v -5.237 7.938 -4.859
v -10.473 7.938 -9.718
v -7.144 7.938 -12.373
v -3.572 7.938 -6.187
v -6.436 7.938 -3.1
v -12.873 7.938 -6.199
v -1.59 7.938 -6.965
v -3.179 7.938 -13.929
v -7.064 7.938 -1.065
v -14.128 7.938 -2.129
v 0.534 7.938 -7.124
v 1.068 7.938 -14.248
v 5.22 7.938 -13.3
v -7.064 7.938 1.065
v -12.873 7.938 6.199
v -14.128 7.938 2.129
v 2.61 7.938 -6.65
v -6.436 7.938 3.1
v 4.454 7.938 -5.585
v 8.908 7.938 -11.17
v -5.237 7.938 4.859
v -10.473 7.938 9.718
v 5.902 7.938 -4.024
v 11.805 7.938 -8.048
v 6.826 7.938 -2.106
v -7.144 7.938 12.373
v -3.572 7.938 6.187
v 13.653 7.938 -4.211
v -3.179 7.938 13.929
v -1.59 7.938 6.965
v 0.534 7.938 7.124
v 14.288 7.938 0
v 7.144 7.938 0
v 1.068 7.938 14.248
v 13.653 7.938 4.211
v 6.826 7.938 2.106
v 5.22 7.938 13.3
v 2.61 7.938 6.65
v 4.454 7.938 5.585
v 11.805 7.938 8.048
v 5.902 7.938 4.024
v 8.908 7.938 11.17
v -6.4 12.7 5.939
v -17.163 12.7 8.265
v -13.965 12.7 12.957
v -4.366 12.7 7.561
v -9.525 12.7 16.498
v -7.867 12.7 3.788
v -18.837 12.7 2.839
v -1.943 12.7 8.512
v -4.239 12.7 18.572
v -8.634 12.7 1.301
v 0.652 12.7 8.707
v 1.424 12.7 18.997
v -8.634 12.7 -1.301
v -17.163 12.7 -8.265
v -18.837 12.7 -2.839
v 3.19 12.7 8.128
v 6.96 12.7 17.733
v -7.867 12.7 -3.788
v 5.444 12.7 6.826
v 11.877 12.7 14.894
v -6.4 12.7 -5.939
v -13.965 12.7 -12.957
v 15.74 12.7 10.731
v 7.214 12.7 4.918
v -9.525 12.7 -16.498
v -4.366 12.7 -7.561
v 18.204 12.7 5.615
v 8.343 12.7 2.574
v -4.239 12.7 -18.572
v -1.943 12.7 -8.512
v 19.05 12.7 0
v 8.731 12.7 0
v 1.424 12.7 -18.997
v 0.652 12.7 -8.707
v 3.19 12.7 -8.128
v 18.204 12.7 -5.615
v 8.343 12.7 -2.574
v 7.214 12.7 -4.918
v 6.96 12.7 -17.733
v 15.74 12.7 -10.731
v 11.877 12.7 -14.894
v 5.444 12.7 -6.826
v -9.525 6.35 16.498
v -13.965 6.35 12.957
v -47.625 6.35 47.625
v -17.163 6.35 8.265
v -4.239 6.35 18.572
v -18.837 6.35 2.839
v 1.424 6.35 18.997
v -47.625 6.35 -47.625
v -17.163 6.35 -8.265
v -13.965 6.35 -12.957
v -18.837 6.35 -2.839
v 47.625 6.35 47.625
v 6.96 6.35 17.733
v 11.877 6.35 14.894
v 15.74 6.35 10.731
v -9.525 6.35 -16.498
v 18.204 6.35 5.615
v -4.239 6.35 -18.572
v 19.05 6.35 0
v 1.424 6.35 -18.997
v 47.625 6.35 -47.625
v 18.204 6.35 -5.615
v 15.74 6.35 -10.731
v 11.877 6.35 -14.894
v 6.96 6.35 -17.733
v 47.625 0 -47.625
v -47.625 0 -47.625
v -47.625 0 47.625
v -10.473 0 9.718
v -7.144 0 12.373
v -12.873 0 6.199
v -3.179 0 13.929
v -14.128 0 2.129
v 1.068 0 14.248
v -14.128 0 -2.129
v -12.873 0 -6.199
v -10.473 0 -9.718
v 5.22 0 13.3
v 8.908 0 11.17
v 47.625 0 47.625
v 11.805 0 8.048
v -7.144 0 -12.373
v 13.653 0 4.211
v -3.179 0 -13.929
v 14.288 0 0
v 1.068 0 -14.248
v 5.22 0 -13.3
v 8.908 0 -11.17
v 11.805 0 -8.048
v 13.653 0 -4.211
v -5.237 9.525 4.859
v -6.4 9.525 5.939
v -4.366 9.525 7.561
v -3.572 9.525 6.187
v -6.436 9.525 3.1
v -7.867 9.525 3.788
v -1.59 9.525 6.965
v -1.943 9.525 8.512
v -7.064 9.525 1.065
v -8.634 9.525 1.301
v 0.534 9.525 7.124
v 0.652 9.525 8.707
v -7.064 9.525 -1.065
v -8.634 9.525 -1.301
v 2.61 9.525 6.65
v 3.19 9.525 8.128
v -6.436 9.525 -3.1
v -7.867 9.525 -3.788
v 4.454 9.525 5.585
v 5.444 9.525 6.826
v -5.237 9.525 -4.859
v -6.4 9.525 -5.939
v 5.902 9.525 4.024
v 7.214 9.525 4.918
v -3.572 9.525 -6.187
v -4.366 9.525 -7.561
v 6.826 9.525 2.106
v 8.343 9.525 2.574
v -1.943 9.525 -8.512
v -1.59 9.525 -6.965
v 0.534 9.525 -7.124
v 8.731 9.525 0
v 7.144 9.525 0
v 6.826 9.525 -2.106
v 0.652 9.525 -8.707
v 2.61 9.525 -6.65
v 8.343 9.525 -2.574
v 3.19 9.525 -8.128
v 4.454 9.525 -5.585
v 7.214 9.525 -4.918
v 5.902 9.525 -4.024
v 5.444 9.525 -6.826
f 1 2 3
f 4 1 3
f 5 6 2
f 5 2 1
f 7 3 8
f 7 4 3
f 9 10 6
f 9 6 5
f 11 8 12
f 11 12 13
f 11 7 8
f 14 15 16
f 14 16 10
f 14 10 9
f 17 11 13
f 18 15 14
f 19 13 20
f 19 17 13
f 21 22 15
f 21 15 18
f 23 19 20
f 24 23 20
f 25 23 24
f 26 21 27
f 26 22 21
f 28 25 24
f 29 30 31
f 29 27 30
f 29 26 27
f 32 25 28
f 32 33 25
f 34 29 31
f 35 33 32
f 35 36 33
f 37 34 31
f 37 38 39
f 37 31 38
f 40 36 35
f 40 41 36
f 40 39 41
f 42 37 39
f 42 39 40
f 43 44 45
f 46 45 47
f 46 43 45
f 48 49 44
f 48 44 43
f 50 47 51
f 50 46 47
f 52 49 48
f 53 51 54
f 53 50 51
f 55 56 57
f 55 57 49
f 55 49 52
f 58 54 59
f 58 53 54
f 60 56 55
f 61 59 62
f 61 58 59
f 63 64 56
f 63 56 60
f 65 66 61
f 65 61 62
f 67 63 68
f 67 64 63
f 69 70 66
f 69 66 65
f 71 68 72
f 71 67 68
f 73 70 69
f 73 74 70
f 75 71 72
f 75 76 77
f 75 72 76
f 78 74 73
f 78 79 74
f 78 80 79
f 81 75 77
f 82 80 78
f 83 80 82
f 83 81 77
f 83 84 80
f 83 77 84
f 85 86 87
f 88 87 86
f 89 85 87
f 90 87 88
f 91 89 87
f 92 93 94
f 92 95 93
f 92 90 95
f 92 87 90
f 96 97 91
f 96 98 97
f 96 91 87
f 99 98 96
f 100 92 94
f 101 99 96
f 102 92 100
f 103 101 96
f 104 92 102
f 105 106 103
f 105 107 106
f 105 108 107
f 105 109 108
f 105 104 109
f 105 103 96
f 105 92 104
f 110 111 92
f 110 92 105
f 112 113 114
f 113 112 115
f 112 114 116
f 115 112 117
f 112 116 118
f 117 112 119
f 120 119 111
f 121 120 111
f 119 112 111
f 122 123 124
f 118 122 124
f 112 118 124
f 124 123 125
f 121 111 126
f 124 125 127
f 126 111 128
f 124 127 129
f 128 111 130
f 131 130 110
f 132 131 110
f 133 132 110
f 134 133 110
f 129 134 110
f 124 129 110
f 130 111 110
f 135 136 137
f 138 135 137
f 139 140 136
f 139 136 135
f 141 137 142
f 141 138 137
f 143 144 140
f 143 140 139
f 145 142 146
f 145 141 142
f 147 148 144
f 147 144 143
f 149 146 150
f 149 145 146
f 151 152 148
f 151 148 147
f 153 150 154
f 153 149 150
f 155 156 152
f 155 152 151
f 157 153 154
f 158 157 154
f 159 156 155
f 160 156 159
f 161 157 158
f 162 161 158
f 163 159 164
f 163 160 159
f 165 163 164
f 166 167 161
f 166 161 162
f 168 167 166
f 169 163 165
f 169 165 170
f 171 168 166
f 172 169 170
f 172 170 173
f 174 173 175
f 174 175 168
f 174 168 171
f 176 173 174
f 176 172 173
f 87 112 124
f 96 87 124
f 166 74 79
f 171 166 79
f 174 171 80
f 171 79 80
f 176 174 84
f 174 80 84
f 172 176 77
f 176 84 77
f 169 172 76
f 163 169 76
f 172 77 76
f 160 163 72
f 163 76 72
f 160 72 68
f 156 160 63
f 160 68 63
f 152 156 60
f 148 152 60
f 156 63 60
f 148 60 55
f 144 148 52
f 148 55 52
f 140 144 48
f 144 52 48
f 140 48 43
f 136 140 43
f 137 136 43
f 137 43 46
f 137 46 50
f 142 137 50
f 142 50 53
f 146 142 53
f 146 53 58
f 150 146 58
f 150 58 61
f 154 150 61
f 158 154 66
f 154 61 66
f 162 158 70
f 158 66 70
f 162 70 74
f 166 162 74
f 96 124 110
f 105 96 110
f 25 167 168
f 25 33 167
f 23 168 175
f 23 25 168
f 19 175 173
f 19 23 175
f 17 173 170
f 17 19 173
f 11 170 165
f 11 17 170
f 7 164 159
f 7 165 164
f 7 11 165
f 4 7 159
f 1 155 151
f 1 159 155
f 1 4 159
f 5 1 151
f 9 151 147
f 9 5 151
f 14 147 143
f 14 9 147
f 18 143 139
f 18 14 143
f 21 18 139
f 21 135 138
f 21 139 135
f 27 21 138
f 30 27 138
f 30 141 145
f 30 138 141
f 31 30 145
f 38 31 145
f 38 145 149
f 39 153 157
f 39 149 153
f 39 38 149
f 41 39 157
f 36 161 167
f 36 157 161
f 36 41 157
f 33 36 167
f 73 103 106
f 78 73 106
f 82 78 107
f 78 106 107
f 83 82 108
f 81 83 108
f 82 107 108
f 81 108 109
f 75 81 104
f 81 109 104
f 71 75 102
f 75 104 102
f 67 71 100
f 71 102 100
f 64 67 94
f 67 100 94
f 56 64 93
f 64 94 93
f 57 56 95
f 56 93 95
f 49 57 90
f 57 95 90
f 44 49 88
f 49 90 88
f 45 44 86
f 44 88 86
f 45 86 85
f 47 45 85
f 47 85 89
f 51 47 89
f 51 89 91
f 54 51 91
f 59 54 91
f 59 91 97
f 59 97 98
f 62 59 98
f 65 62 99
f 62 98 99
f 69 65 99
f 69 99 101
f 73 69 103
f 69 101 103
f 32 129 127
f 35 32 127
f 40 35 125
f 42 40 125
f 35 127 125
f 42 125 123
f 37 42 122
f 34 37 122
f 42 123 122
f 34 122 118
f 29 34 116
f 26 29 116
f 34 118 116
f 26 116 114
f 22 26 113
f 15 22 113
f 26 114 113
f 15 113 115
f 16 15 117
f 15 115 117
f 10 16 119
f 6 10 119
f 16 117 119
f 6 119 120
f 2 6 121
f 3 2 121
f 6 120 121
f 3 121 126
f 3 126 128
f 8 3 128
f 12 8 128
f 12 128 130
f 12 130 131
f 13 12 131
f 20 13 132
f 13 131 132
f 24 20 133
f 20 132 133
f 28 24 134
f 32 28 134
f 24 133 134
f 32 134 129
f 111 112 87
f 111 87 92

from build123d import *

# Parameters (mm, degrees)
SKETCH1_W           = 95.25
SKETCH1_H           = 95.25
SKETCH1_R           = 7.14375
BOSS_EXTRUDE1_DEPTH = 6.35
SKETCH3_R           = 19.05
SKETCH3_R_2         = 7.14375
BOSS_EXTRUDE2_DEPTH = 6.35
SKETCH2_R           = 14.2875
CUT_EXTRUDE1_DEPTH  = 7.9375
SKETCH4_R           = 8.73125
CUT_EXTRUDE2_DEPTH  = 3.175


with BuildPart() as part:
    # Sketch1 → Boss-Extrude1 (new body)
    with BuildSketch(Plane(origin=(0, 0, 0), x_dir=(1, 0, 0), z_dir=(0, 1, 0))):
        Rectangle(SKETCH1_W, SKETCH1_H)
        Circle(SKETCH1_R, mode=Mode.SUBTRACT)
    extrude(amount=BOSS_EXTRUDE1_DEPTH)

    # Sketch3 → Boss-Extrude2 (add)
    with BuildSketch(Plane(origin=(0, 6.35, 0), x_dir=(1, 0, 0), z_dir=(0, 1, 0))):
        Circle(SKETCH3_R)
        Circle(SKETCH3_R_2, mode=Mode.SUBTRACT)
    extrude(amount=BOSS_EXTRUDE2_DEPTH)

    # Sketch2 → Cut-Extrude1 (cut)
    with BuildSketch(Plane.XZ):
        Circle(SKETCH2_R)
    extrude(amount=-CUT_EXTRUDE1_DEPTH, mode=Mode.SUBTRACT)

    # Sketch4 → Cut-Extrude2 (cut)
    with BuildSketch(Plane(origin=(0, 12.7, 0), x_dir=(1, 0, 0), z_dir=(0, 1, 0))):
        Circle(SKETCH4_R)
    extrude(amount=-CUT_EXTRUDE2_DEPTH, mode=Mode.SUBTRACT)


solid = part.part
